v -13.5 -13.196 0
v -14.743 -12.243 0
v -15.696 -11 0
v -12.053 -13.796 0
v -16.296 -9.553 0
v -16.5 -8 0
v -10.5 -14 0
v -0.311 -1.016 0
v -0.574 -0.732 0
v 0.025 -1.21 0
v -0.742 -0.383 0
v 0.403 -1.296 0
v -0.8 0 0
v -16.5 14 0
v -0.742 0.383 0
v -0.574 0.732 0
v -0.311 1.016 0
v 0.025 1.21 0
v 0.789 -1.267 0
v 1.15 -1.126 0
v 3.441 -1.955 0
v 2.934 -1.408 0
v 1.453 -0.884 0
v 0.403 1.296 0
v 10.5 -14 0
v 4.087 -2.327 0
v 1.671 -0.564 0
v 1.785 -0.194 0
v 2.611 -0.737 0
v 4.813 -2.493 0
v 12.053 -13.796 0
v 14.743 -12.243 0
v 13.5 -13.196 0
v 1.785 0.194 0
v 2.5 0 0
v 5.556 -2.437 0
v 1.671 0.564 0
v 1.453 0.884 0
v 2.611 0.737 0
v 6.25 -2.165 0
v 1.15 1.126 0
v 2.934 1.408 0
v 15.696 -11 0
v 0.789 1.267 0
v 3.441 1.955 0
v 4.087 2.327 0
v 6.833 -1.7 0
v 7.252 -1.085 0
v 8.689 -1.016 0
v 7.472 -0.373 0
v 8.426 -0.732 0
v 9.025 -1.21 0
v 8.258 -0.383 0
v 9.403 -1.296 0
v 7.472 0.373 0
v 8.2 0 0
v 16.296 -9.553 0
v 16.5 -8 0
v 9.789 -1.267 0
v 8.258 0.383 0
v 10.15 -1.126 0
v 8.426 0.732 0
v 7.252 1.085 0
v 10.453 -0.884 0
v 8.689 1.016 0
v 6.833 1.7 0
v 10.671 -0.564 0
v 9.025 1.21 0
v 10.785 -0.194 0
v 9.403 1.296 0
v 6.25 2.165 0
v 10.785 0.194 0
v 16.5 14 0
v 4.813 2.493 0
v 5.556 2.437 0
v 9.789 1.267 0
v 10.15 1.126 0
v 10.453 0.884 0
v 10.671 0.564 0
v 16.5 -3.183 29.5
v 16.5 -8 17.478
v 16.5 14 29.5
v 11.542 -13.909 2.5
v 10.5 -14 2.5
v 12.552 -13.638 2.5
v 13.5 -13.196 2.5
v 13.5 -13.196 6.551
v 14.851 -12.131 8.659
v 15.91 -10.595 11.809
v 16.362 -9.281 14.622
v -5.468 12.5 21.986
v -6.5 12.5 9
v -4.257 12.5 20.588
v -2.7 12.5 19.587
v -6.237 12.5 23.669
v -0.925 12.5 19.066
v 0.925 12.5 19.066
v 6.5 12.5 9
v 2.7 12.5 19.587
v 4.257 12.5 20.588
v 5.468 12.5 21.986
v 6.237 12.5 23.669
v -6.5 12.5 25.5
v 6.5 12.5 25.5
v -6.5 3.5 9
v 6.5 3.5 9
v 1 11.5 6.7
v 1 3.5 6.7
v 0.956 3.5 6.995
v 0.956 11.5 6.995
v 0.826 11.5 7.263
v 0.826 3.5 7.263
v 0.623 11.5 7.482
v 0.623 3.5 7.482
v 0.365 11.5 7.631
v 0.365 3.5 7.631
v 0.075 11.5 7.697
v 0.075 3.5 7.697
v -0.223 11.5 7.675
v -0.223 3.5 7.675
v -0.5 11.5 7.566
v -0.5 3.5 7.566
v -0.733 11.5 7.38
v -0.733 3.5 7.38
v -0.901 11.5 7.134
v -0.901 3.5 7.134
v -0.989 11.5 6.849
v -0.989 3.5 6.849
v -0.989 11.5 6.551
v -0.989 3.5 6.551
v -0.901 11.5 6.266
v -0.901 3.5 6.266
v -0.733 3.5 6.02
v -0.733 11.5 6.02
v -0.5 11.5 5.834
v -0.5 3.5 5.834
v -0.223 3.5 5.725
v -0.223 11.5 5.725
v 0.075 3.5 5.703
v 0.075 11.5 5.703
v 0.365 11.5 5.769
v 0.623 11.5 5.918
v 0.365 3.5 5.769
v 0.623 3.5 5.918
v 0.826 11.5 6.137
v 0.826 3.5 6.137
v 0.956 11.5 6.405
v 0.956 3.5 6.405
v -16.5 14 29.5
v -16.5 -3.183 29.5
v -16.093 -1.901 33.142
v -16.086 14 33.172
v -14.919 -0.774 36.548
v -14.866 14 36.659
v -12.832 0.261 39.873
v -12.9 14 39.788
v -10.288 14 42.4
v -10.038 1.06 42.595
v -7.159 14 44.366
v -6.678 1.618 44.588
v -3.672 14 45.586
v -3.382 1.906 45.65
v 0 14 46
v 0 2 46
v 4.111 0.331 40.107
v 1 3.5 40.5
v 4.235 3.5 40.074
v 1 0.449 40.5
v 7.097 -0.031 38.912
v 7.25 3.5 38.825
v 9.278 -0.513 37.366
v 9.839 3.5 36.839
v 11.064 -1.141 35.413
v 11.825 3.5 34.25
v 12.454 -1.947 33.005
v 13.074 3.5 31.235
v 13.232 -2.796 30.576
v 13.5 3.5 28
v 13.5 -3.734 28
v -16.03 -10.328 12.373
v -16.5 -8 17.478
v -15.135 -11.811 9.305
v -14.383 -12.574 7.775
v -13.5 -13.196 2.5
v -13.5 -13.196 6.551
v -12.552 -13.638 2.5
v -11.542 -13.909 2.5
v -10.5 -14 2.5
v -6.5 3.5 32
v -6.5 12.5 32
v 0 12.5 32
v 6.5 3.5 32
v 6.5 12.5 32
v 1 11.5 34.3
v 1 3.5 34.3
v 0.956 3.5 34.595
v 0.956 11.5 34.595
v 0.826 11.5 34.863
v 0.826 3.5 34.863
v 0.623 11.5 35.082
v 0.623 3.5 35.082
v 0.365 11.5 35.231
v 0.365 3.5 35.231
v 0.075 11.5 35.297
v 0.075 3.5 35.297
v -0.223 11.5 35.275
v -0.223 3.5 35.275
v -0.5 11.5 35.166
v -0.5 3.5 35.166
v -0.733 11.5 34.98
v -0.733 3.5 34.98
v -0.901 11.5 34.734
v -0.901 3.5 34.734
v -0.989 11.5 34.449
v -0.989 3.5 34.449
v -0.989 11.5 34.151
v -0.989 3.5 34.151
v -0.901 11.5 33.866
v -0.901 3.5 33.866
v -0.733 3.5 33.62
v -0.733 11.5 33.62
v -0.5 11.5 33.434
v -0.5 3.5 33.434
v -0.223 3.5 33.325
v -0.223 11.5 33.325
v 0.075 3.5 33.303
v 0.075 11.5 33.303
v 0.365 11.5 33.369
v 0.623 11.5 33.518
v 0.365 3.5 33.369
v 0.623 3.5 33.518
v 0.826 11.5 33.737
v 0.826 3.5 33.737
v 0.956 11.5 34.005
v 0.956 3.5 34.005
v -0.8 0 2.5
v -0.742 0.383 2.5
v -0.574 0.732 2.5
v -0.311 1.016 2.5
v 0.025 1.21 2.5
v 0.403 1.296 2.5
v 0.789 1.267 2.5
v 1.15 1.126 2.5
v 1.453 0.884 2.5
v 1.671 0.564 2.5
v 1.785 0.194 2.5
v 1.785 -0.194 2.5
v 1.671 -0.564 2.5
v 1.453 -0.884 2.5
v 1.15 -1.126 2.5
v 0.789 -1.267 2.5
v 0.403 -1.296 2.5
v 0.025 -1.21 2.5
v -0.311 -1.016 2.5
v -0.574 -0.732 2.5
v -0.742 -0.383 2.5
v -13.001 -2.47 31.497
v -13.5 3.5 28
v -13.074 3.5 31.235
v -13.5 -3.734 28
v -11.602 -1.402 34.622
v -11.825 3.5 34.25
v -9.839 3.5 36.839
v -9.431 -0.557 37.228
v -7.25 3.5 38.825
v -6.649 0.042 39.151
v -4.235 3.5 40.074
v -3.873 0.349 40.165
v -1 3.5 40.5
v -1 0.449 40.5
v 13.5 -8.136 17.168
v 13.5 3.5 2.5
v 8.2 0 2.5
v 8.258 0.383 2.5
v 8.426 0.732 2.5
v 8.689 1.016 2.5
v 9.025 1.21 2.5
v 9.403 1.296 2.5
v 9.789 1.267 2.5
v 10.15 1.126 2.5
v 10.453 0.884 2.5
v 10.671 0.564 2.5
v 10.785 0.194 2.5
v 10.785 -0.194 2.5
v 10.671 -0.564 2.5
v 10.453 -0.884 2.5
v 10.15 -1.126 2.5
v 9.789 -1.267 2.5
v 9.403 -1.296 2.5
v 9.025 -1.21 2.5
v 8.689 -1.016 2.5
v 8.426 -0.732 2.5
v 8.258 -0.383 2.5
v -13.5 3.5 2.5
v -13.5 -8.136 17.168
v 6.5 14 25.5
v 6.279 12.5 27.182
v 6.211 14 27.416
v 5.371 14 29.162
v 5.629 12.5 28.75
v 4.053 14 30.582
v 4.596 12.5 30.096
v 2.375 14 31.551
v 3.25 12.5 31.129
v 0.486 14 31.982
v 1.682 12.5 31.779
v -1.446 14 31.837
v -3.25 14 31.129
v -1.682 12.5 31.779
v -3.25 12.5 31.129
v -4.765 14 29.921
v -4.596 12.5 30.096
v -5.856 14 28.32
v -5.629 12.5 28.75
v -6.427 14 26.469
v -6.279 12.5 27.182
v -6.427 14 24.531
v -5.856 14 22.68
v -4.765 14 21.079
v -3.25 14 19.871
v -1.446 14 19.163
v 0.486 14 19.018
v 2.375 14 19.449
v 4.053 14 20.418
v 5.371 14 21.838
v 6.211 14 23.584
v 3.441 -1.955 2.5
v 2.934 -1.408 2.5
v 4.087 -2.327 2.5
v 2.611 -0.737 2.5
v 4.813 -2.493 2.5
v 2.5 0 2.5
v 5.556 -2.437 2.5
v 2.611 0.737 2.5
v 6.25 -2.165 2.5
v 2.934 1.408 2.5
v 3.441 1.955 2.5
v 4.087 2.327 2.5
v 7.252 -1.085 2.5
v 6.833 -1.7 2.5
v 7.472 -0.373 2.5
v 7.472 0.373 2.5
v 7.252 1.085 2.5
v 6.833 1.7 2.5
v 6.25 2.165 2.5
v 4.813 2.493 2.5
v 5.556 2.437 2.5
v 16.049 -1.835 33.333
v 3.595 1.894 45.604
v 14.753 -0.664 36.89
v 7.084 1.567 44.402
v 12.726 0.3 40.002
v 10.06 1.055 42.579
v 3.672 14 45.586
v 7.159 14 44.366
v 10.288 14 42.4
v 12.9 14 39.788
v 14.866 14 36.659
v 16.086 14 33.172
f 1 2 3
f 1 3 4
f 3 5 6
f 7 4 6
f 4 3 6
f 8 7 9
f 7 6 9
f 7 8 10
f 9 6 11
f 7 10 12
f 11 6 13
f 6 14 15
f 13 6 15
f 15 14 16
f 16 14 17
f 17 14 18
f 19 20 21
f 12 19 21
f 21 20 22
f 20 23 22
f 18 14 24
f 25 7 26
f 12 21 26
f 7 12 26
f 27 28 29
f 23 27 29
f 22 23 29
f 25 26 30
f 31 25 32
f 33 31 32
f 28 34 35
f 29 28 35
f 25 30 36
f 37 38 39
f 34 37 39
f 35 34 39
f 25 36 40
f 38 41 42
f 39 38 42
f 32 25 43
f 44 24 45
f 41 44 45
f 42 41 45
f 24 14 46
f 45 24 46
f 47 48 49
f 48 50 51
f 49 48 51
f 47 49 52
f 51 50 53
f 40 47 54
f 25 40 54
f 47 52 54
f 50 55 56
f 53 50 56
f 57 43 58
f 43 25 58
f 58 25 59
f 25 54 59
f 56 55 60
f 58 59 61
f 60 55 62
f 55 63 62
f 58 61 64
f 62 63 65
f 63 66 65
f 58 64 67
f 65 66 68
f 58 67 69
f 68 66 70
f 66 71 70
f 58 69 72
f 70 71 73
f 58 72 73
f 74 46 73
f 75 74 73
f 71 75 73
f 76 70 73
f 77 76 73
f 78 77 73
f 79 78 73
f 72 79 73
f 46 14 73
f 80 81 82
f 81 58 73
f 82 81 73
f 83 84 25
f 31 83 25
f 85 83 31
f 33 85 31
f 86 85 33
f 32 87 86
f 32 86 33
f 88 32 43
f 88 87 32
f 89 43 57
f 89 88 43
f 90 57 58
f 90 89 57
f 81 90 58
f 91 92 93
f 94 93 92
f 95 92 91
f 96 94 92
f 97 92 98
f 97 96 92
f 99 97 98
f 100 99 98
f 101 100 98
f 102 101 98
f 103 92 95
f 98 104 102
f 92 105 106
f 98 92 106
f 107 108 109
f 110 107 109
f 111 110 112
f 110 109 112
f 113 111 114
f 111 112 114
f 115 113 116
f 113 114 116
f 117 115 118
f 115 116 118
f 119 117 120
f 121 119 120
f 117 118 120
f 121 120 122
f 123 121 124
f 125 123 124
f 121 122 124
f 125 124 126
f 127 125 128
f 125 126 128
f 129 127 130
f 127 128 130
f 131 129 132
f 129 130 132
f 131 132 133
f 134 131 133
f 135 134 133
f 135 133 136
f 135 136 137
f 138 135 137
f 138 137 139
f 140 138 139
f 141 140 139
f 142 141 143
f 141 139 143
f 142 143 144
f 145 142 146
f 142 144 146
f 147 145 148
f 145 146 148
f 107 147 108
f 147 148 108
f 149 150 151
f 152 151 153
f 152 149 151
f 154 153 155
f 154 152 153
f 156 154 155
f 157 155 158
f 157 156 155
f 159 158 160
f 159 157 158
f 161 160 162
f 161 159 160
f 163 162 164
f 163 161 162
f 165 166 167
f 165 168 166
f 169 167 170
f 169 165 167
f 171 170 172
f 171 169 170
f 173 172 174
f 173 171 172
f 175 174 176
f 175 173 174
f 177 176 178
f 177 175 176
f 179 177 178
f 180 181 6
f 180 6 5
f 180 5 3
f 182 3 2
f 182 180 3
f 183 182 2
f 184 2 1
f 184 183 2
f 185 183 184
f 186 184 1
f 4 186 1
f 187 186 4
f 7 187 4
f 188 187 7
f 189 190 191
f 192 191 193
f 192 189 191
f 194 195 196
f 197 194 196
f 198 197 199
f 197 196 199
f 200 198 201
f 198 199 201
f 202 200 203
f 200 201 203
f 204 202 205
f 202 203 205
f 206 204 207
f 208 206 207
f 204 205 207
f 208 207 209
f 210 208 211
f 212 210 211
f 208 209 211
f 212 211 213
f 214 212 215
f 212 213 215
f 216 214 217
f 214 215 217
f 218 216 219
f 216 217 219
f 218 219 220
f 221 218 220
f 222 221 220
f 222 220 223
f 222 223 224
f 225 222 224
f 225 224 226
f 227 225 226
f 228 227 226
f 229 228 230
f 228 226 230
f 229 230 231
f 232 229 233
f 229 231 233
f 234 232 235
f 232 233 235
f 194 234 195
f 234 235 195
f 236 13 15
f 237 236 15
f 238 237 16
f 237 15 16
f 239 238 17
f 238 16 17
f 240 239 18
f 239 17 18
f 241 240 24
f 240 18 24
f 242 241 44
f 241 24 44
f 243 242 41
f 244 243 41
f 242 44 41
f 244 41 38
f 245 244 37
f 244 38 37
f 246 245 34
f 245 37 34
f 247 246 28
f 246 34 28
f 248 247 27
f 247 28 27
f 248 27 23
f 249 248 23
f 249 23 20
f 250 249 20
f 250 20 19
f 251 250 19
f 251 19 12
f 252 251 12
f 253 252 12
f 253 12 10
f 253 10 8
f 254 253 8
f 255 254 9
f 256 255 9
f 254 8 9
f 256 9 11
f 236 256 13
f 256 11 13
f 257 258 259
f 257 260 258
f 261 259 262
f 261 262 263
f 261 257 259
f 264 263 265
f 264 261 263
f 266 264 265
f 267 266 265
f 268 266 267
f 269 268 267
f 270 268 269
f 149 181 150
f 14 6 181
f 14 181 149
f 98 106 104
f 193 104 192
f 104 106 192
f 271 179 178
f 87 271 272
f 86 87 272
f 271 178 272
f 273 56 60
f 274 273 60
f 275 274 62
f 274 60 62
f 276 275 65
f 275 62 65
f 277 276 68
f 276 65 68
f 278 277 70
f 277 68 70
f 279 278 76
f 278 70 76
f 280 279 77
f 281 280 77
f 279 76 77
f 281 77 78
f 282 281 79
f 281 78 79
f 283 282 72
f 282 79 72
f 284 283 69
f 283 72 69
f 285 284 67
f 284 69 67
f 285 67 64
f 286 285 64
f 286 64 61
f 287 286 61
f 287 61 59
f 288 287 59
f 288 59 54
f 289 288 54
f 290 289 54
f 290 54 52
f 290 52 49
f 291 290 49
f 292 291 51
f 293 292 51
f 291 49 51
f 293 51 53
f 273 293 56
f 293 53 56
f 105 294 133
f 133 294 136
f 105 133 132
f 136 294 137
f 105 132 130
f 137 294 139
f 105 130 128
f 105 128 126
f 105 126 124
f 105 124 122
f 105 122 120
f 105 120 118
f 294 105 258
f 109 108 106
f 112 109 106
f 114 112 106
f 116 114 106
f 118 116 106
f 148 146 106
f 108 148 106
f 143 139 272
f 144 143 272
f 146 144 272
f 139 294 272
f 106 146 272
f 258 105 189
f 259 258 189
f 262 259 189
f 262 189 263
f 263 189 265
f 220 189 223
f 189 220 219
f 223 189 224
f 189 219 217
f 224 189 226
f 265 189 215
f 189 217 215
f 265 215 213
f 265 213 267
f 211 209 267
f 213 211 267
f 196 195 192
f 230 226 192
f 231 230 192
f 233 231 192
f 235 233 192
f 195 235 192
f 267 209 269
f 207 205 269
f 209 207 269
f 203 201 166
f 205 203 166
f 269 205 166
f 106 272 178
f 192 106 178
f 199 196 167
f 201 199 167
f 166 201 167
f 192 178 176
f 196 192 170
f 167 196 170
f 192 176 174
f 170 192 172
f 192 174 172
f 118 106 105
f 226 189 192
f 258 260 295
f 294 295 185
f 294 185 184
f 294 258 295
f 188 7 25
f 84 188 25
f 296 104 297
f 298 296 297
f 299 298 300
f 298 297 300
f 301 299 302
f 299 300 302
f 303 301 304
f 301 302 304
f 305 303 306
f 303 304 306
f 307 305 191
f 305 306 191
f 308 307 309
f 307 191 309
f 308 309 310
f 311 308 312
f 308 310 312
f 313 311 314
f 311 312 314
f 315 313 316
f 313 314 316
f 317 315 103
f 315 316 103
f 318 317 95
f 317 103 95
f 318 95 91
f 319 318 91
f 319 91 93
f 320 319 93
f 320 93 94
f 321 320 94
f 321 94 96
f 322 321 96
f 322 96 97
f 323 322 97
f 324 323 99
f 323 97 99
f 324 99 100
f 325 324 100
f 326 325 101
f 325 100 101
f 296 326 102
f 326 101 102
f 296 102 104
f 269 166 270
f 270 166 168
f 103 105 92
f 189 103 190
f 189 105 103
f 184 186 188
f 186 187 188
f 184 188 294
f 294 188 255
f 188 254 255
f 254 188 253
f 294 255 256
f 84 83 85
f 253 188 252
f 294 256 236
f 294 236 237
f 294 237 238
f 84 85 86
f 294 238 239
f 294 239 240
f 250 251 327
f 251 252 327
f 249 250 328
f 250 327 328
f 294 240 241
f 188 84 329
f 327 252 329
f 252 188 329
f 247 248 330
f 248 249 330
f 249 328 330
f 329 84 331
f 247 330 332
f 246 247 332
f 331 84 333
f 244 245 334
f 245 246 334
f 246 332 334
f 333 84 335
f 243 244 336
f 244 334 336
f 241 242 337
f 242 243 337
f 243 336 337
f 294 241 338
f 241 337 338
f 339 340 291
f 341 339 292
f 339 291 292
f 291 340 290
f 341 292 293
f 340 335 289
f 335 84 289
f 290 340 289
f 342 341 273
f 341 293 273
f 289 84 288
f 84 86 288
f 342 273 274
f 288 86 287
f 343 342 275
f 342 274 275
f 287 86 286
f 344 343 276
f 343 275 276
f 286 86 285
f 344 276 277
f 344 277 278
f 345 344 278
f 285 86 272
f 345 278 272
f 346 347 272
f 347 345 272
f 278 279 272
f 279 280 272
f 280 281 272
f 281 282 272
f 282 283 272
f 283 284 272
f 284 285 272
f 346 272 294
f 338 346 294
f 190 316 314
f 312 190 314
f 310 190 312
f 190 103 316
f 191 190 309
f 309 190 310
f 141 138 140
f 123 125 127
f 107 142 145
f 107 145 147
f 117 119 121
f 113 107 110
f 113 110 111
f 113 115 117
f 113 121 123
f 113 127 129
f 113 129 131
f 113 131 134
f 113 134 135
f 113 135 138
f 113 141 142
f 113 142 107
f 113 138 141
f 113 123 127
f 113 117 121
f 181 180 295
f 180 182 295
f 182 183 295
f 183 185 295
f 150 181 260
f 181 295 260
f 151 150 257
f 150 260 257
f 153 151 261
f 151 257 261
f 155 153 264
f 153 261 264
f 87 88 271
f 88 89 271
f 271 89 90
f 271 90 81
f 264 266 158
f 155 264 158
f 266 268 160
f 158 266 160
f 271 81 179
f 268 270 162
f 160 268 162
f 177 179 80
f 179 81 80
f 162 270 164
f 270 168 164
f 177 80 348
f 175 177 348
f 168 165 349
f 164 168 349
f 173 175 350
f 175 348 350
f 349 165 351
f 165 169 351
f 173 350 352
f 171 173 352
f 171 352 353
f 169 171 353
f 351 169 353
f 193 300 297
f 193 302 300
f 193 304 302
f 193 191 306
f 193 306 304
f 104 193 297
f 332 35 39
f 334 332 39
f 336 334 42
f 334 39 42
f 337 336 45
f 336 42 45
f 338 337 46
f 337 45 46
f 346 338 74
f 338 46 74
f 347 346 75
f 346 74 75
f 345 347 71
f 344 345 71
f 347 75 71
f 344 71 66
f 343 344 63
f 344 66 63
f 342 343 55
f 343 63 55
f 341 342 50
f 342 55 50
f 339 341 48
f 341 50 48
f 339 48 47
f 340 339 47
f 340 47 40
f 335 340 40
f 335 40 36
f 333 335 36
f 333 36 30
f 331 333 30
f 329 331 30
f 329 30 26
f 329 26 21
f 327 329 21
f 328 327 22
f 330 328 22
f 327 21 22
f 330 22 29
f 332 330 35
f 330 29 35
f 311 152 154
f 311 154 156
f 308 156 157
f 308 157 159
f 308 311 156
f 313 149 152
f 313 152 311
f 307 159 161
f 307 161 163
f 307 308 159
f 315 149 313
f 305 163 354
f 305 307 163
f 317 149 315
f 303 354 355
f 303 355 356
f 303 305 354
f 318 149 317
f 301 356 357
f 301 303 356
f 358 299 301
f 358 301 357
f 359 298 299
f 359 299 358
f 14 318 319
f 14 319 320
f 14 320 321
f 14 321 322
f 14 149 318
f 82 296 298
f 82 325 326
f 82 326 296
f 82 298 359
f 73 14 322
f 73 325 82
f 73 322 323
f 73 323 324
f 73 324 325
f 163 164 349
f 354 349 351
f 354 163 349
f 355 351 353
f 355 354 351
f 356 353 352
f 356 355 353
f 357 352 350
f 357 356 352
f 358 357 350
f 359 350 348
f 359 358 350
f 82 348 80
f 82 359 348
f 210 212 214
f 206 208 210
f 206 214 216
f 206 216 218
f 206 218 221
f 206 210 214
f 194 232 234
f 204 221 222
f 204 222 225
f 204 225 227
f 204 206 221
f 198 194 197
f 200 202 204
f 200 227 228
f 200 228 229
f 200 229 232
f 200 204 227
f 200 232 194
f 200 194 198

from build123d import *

# Parameters (mm, degrees)
SKETCH1_W           = 33
SKETCH1_H           = 28
BOSS_EXTRUDE1_DEPTH = 46
CUT_EXTRUDE1_DEPTH  = 59.318093247
CUT_EXTRUDE2_START  = -3
CUT_EXTRUDE2_DEPTH  = 27
FILLET1_R           = 12.5
FILLET2_R           = 16.5
FILLET3_R           = 6
SKETCH4_W           = 13
SKETCH4_H           = 23
CUT_EXTRUDE3_DEPTH  = 9
SKETCH5_R           = 6.5
CUT_EXTRUDE4_DEPTH  = 56.592265809
SKETCH6_R           = 1
CUT_EXTRUDE6_DEPTH  = 8
SKETCH7_R           = 1.3
SKETCH7_R_2         = 2.5
CUT_EXTRUDE7_DEPTH  = 2.5


with BuildPart() as part:
    # Sketch1 → Boss-Extrude1 (new body)
    with BuildSketch(Plane.XY):
        Rectangle(SKETCH1_W, SKETCH1_H)
    extrude(amount=BOSS_EXTRUDE1_DEPTH)

    # Sketch2 → Cut-Extrude1 (cut, through all)
    with BuildSketch(Plane(origin=(16.5, 0, 0), x_dir=(0, 0, -1), z_dir=(1, 0, 0))):
        with BuildLine():
            Line((-46, 2), (-46, -14))
            Line((-46, -14), (-5, -14))
            add(Edge.make_bspline(
                [(-5, -14), (-24.736297584, -3.666123858), (-46, 2)],
                knots=[0, 0, 0, 1, 1, 1], degree=2))
        make_face()
    extrude(amount=-CUT_EXTRUDE1_DEPTH, mode=Mode.SUBTRACT)

    # Sketch3 → Cut-Extrude2 (cut)
    with BuildSketch(Plane(origin=(16.5, 0, 0), x_dir=(0, 0, -1), z_dir=(1, 0, 0)).offset(CUT_EXTRUDE2_START)):
        with BuildLine():
            Line((-5, -14), (-2.5, -14))
            Line((-2.5, -14), (-2.5, 3.5))
            Line((-2.5, 3.5), (-40.5, 3.5))
            Line((-40.5, 3.5), (-40.5, 0.448741524))
            add(Edge.make_bspline(
                [(-5, -14), (-22.171866916, -5.008853353), (-40.5, 0.448741524)],
                knots=[0, 0, 0, 1, 1, 1], degree=2))
        make_face()
    extrude(amount=-CUT_EXTRUDE2_DEPTH, mode=Mode.SUBTRACT)

    # Fillet1
    fillet1_edges = [part.edges().sort_by_distance(p)[0] for p in [
        (13.5, 1.974370762, 40.5),
        (-13.5, 1.974370762, 40.5),
    ]]
    fillet(fillet1_edges, radius=FILLET1_R)

    # Fillet2
    fillet2_edges = [part.edges().sort_by_distance(p)[0] for p in [
        (16.5, 8, 46),
        (-16.5, 8, 46),
    ]]
    fillet(fillet2_edges, radius=FILLET2_R - 0.0001)  # a hair under: the kernel refuses the full size

    # Fillet3
    fillet3_edges = [part.edges().sort_by_distance(p)[0] for p in [
        (-16.5, -14, 2.5),
        (16.5, -14, 2.5),
    ]]
    fillet(fillet3_edges, radius=FILLET3_R)

    # Sketch4 → Cut-Extrude3 (cut)
    with BuildSketch(Plane.XZ.offset(-3.5)):
        with Locations((0, 20.5)):
            Rectangle(SKETCH4_W, SKETCH4_H)
    extrude(amount=-CUT_EXTRUDE3_DEPTH, mode=Mode.SUBTRACT)

    # Sketch5 → Cut-Extrude4 (cut, through all)
    with BuildSketch(Plane.XZ.offset(-12.5)):
        with Locations((0, 25.5)):
            Circle(SKETCH5_R)
    extrude(amount=-CUT_EXTRUDE4_DEPTH, mode=Mode.SUBTRACT)

    # Sketch6 → Cut-Extrude6 (cut)
    with BuildSketch(Plane.XZ.offset(-3.5)):
        with Locations((0, 34.3)):
            Circle(SKETCH6_R)
        with Locations((0, 6.7)):
            Circle(SKETCH6_R)
    extrude(amount=-CUT_EXTRUDE6_DEPTH, mode=Mode.SUBTRACT)

    # Sketch7 → Cut-Extrude7 (cut)
    with BuildSketch(Plane(origin=(0, 0, 0), x_dir=(-1, 0, 0), z_dir=(0, 0, -1))):
        with Locations((-9.5, 0)):
            Circle(SKETCH7_R)
        with Locations((-5, 0)):
            Circle(SKETCH7_R_2)
        with Locations((-0.5, 0)):
            Circle(SKETCH7_R)
    extrude(amount=-CUT_EXTRUDE7_DEPTH, mode=Mode.SUBTRACT)


solid = part.part
